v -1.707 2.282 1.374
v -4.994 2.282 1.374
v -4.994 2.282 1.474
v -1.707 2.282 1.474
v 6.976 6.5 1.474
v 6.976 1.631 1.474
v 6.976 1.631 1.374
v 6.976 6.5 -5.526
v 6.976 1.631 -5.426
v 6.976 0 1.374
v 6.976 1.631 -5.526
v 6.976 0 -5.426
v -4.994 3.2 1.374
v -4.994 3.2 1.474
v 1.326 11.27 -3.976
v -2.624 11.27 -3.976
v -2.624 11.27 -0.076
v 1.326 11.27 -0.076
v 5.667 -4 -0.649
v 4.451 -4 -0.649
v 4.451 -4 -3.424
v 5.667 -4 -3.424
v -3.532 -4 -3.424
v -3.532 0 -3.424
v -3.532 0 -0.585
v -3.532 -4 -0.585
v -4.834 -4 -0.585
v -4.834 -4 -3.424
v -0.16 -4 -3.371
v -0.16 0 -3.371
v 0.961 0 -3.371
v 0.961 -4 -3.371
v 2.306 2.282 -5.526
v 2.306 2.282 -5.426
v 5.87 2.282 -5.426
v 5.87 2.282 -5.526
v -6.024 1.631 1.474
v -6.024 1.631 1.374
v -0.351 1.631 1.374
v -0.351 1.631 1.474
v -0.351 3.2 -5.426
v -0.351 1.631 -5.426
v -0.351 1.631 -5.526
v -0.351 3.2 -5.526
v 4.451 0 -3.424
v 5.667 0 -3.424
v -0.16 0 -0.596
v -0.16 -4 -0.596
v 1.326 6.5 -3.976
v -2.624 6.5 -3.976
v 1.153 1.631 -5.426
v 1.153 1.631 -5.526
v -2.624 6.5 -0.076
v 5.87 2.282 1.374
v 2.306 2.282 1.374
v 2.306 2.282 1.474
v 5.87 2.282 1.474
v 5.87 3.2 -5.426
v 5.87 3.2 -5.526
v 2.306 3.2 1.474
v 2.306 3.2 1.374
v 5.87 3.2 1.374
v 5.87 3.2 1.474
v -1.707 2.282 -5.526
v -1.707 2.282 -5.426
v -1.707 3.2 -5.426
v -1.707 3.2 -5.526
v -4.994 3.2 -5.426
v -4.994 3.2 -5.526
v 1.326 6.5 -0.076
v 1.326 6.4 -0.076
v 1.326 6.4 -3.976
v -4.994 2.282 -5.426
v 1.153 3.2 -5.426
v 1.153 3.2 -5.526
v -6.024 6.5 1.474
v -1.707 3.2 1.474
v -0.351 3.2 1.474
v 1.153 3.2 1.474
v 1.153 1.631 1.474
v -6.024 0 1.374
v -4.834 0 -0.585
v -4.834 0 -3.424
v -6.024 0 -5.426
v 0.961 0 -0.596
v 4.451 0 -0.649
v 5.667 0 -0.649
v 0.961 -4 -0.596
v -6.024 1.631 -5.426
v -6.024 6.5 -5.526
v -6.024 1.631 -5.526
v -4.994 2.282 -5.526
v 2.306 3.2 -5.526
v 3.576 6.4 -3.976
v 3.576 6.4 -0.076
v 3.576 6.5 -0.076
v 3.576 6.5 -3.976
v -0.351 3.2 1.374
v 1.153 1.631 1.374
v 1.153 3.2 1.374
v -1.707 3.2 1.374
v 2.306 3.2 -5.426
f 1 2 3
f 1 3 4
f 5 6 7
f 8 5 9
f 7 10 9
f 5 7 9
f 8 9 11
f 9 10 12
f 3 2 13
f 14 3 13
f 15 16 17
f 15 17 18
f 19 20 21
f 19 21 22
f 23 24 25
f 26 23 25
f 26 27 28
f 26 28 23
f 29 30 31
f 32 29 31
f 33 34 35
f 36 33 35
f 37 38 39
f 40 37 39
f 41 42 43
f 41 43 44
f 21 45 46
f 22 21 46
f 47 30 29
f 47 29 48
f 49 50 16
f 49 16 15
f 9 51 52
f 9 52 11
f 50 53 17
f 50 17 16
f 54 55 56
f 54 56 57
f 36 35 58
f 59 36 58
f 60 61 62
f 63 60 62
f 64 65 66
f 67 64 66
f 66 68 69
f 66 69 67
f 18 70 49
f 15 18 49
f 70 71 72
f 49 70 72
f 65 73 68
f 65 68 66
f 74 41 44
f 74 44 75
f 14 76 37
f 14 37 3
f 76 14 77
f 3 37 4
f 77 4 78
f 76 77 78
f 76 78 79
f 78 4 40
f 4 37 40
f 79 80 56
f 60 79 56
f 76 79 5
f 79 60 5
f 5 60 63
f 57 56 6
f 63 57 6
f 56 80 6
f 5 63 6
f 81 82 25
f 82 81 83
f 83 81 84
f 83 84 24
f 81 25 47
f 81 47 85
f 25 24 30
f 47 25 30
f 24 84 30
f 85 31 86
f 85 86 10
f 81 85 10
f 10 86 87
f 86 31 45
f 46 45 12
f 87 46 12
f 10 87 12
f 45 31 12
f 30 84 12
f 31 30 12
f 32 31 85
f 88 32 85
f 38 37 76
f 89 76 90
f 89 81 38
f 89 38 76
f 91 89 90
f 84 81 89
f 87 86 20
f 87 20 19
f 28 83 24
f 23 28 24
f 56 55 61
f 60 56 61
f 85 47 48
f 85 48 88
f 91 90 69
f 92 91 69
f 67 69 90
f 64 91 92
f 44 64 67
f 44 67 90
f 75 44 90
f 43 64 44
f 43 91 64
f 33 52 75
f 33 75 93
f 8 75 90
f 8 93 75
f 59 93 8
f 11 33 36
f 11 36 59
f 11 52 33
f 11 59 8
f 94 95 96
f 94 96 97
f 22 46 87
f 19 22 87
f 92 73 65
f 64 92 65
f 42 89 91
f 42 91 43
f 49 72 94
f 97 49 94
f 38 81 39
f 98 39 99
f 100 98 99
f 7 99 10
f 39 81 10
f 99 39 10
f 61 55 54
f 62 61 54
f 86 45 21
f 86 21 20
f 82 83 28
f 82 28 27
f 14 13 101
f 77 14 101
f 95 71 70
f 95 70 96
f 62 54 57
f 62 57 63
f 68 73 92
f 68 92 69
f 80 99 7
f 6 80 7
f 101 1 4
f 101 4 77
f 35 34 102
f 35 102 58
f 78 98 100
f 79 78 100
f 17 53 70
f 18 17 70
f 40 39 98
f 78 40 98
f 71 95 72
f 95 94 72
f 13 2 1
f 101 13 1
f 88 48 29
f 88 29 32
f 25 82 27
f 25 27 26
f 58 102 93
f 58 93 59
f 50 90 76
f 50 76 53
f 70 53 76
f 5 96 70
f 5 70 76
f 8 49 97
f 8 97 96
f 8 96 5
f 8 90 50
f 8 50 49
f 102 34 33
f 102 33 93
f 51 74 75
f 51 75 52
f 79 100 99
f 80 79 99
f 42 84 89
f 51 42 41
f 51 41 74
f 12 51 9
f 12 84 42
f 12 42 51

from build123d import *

# Parameters (mm, degrees)
SKETCH1_W                = 13
SKETCH1_H                = 6.8
BOSS_EXTRUDE1_DEPTH      = 6.4
SKETCH2_W                = 3.286897276
SKETCH2_H                = 0.917770019
SKETCH2_W_2              = 3.564362631
BOSS_EXTRUDE2_DEPTH      = 0.1
BOSS_EXTRUDE2_DEPTH_BACK = 6.9
SKETCH3_W                = 13
SKETCH3_H                = 7
SKETCH3_W_2              = 6.2
SKETCH3_H_2              = 3.9
BOSS_EXTRUDE3_DEPTH      = 0.1
SKETCH4_W                = 3.95
SKETCH4_H                = 3.9
BOSS_EXTRUDE4_DEPTH      = 4.87
SKETCH5_W                = 1.121207547
SKETCH5_H                = 2.774653545
SKETCH5_W_2              = 1.301952817
SKETCH5_H_2              = 2.838684011
SKETCH5_W_3              = 1.216578862
BOSS_EXTRUDE5_DEPTH      = 4


with BuildPart() as part:
    # Sketch1 → Boss-Extrude1 (new body)
    with BuildSketch(Plane(origin=(0, 0, 0), x_dir=(1, 0, 0), z_dir=(0, 1, 0))):
        with Locations((0.47556701, 2.025979381)):
            Rectangle(SKETCH1_W, SKETCH1_H)
    extrude(amount=BOSS_EXTRUDE1_DEPTH)

    # Sketch2 → Boss-Extrude2 (add, two sides)
    with BuildSketch(Plane.XY.offset(1.374020619)) as boss_extrude2_sk:
        Polygon((6.97556701, 6.4), (-6.02443299, 6.4), (-6.02443299, 1.631253573), (-0.351493181, 1.631253573), (-0.351493181, 3.2), (1.15322278, 3.2), (1.15322278, 1.631253573), (6.97556701, 1.631253573), align=None)
        with Locations((-3.350253358, 2.74111499)):
            Rectangle(SKETCH2_W, SKETCH2_H, mode=Mode.SUBTRACT)
        with Locations((4.087952491, 2.74111499)):
            Rectangle(SKETCH2_W_2, SKETCH2_H, mode=Mode.SUBTRACT)
    extrude(amount=BOSS_EXTRUDE2_DEPTH)
    extrude(boss_extrude2_sk.sketch, amount=-BOSS_EXTRUDE2_DEPTH_BACK)

    # Sketch3 → Boss-Extrude3 (add)
    with BuildSketch(Plane(origin=(0, 6.4, 0), x_dir=(1, 0, 0), z_dir=(0, 1, 0))):
        with Locations((0.47556701, 2.025979381)):
            Rectangle(SKETCH3_W, SKETCH3_H)
        with Locations((0.47556701, 2.025979381)):
            Rectangle(SKETCH3_W_2, SKETCH3_H_2, mode=Mode.SUBTRACT)
    extrude(amount=BOSS_EXTRUDE3_DEPTH)

    # Sketch4 → Boss-Extrude4 (add)
    with BuildSketch(Plane(origin=(0, 6.4, 0), x_dir=(1, 0, 0), z_dir=(0, 1, 0))):
        with Locations((-0.64943299, 2.025979381)):
            Rectangle(SKETCH4_W, SKETCH4_H)
    extrude(amount=BOSS_EXTRUDE4_DEPTH)

    # Sketch5 → Boss-Extrude5 (add)
    with BuildSketch(Plane.XZ):
        with Locations((0.400527608, -1.983292404)):
            Rectangle(SKETCH5_W, SKETCH5_H)
        with Locations((-4.182649421, -2.004635893)):
            Rectangle(SKETCH5_W_2, SKETCH5_H_2)
        with Locations((5.059081231, -2.036651126)):
            Rectangle(SKETCH5_W_3, SKETCH5_H)
    extrude(amount=BOSS_EXTRUDE5_DEPTH)


solid = part.part
